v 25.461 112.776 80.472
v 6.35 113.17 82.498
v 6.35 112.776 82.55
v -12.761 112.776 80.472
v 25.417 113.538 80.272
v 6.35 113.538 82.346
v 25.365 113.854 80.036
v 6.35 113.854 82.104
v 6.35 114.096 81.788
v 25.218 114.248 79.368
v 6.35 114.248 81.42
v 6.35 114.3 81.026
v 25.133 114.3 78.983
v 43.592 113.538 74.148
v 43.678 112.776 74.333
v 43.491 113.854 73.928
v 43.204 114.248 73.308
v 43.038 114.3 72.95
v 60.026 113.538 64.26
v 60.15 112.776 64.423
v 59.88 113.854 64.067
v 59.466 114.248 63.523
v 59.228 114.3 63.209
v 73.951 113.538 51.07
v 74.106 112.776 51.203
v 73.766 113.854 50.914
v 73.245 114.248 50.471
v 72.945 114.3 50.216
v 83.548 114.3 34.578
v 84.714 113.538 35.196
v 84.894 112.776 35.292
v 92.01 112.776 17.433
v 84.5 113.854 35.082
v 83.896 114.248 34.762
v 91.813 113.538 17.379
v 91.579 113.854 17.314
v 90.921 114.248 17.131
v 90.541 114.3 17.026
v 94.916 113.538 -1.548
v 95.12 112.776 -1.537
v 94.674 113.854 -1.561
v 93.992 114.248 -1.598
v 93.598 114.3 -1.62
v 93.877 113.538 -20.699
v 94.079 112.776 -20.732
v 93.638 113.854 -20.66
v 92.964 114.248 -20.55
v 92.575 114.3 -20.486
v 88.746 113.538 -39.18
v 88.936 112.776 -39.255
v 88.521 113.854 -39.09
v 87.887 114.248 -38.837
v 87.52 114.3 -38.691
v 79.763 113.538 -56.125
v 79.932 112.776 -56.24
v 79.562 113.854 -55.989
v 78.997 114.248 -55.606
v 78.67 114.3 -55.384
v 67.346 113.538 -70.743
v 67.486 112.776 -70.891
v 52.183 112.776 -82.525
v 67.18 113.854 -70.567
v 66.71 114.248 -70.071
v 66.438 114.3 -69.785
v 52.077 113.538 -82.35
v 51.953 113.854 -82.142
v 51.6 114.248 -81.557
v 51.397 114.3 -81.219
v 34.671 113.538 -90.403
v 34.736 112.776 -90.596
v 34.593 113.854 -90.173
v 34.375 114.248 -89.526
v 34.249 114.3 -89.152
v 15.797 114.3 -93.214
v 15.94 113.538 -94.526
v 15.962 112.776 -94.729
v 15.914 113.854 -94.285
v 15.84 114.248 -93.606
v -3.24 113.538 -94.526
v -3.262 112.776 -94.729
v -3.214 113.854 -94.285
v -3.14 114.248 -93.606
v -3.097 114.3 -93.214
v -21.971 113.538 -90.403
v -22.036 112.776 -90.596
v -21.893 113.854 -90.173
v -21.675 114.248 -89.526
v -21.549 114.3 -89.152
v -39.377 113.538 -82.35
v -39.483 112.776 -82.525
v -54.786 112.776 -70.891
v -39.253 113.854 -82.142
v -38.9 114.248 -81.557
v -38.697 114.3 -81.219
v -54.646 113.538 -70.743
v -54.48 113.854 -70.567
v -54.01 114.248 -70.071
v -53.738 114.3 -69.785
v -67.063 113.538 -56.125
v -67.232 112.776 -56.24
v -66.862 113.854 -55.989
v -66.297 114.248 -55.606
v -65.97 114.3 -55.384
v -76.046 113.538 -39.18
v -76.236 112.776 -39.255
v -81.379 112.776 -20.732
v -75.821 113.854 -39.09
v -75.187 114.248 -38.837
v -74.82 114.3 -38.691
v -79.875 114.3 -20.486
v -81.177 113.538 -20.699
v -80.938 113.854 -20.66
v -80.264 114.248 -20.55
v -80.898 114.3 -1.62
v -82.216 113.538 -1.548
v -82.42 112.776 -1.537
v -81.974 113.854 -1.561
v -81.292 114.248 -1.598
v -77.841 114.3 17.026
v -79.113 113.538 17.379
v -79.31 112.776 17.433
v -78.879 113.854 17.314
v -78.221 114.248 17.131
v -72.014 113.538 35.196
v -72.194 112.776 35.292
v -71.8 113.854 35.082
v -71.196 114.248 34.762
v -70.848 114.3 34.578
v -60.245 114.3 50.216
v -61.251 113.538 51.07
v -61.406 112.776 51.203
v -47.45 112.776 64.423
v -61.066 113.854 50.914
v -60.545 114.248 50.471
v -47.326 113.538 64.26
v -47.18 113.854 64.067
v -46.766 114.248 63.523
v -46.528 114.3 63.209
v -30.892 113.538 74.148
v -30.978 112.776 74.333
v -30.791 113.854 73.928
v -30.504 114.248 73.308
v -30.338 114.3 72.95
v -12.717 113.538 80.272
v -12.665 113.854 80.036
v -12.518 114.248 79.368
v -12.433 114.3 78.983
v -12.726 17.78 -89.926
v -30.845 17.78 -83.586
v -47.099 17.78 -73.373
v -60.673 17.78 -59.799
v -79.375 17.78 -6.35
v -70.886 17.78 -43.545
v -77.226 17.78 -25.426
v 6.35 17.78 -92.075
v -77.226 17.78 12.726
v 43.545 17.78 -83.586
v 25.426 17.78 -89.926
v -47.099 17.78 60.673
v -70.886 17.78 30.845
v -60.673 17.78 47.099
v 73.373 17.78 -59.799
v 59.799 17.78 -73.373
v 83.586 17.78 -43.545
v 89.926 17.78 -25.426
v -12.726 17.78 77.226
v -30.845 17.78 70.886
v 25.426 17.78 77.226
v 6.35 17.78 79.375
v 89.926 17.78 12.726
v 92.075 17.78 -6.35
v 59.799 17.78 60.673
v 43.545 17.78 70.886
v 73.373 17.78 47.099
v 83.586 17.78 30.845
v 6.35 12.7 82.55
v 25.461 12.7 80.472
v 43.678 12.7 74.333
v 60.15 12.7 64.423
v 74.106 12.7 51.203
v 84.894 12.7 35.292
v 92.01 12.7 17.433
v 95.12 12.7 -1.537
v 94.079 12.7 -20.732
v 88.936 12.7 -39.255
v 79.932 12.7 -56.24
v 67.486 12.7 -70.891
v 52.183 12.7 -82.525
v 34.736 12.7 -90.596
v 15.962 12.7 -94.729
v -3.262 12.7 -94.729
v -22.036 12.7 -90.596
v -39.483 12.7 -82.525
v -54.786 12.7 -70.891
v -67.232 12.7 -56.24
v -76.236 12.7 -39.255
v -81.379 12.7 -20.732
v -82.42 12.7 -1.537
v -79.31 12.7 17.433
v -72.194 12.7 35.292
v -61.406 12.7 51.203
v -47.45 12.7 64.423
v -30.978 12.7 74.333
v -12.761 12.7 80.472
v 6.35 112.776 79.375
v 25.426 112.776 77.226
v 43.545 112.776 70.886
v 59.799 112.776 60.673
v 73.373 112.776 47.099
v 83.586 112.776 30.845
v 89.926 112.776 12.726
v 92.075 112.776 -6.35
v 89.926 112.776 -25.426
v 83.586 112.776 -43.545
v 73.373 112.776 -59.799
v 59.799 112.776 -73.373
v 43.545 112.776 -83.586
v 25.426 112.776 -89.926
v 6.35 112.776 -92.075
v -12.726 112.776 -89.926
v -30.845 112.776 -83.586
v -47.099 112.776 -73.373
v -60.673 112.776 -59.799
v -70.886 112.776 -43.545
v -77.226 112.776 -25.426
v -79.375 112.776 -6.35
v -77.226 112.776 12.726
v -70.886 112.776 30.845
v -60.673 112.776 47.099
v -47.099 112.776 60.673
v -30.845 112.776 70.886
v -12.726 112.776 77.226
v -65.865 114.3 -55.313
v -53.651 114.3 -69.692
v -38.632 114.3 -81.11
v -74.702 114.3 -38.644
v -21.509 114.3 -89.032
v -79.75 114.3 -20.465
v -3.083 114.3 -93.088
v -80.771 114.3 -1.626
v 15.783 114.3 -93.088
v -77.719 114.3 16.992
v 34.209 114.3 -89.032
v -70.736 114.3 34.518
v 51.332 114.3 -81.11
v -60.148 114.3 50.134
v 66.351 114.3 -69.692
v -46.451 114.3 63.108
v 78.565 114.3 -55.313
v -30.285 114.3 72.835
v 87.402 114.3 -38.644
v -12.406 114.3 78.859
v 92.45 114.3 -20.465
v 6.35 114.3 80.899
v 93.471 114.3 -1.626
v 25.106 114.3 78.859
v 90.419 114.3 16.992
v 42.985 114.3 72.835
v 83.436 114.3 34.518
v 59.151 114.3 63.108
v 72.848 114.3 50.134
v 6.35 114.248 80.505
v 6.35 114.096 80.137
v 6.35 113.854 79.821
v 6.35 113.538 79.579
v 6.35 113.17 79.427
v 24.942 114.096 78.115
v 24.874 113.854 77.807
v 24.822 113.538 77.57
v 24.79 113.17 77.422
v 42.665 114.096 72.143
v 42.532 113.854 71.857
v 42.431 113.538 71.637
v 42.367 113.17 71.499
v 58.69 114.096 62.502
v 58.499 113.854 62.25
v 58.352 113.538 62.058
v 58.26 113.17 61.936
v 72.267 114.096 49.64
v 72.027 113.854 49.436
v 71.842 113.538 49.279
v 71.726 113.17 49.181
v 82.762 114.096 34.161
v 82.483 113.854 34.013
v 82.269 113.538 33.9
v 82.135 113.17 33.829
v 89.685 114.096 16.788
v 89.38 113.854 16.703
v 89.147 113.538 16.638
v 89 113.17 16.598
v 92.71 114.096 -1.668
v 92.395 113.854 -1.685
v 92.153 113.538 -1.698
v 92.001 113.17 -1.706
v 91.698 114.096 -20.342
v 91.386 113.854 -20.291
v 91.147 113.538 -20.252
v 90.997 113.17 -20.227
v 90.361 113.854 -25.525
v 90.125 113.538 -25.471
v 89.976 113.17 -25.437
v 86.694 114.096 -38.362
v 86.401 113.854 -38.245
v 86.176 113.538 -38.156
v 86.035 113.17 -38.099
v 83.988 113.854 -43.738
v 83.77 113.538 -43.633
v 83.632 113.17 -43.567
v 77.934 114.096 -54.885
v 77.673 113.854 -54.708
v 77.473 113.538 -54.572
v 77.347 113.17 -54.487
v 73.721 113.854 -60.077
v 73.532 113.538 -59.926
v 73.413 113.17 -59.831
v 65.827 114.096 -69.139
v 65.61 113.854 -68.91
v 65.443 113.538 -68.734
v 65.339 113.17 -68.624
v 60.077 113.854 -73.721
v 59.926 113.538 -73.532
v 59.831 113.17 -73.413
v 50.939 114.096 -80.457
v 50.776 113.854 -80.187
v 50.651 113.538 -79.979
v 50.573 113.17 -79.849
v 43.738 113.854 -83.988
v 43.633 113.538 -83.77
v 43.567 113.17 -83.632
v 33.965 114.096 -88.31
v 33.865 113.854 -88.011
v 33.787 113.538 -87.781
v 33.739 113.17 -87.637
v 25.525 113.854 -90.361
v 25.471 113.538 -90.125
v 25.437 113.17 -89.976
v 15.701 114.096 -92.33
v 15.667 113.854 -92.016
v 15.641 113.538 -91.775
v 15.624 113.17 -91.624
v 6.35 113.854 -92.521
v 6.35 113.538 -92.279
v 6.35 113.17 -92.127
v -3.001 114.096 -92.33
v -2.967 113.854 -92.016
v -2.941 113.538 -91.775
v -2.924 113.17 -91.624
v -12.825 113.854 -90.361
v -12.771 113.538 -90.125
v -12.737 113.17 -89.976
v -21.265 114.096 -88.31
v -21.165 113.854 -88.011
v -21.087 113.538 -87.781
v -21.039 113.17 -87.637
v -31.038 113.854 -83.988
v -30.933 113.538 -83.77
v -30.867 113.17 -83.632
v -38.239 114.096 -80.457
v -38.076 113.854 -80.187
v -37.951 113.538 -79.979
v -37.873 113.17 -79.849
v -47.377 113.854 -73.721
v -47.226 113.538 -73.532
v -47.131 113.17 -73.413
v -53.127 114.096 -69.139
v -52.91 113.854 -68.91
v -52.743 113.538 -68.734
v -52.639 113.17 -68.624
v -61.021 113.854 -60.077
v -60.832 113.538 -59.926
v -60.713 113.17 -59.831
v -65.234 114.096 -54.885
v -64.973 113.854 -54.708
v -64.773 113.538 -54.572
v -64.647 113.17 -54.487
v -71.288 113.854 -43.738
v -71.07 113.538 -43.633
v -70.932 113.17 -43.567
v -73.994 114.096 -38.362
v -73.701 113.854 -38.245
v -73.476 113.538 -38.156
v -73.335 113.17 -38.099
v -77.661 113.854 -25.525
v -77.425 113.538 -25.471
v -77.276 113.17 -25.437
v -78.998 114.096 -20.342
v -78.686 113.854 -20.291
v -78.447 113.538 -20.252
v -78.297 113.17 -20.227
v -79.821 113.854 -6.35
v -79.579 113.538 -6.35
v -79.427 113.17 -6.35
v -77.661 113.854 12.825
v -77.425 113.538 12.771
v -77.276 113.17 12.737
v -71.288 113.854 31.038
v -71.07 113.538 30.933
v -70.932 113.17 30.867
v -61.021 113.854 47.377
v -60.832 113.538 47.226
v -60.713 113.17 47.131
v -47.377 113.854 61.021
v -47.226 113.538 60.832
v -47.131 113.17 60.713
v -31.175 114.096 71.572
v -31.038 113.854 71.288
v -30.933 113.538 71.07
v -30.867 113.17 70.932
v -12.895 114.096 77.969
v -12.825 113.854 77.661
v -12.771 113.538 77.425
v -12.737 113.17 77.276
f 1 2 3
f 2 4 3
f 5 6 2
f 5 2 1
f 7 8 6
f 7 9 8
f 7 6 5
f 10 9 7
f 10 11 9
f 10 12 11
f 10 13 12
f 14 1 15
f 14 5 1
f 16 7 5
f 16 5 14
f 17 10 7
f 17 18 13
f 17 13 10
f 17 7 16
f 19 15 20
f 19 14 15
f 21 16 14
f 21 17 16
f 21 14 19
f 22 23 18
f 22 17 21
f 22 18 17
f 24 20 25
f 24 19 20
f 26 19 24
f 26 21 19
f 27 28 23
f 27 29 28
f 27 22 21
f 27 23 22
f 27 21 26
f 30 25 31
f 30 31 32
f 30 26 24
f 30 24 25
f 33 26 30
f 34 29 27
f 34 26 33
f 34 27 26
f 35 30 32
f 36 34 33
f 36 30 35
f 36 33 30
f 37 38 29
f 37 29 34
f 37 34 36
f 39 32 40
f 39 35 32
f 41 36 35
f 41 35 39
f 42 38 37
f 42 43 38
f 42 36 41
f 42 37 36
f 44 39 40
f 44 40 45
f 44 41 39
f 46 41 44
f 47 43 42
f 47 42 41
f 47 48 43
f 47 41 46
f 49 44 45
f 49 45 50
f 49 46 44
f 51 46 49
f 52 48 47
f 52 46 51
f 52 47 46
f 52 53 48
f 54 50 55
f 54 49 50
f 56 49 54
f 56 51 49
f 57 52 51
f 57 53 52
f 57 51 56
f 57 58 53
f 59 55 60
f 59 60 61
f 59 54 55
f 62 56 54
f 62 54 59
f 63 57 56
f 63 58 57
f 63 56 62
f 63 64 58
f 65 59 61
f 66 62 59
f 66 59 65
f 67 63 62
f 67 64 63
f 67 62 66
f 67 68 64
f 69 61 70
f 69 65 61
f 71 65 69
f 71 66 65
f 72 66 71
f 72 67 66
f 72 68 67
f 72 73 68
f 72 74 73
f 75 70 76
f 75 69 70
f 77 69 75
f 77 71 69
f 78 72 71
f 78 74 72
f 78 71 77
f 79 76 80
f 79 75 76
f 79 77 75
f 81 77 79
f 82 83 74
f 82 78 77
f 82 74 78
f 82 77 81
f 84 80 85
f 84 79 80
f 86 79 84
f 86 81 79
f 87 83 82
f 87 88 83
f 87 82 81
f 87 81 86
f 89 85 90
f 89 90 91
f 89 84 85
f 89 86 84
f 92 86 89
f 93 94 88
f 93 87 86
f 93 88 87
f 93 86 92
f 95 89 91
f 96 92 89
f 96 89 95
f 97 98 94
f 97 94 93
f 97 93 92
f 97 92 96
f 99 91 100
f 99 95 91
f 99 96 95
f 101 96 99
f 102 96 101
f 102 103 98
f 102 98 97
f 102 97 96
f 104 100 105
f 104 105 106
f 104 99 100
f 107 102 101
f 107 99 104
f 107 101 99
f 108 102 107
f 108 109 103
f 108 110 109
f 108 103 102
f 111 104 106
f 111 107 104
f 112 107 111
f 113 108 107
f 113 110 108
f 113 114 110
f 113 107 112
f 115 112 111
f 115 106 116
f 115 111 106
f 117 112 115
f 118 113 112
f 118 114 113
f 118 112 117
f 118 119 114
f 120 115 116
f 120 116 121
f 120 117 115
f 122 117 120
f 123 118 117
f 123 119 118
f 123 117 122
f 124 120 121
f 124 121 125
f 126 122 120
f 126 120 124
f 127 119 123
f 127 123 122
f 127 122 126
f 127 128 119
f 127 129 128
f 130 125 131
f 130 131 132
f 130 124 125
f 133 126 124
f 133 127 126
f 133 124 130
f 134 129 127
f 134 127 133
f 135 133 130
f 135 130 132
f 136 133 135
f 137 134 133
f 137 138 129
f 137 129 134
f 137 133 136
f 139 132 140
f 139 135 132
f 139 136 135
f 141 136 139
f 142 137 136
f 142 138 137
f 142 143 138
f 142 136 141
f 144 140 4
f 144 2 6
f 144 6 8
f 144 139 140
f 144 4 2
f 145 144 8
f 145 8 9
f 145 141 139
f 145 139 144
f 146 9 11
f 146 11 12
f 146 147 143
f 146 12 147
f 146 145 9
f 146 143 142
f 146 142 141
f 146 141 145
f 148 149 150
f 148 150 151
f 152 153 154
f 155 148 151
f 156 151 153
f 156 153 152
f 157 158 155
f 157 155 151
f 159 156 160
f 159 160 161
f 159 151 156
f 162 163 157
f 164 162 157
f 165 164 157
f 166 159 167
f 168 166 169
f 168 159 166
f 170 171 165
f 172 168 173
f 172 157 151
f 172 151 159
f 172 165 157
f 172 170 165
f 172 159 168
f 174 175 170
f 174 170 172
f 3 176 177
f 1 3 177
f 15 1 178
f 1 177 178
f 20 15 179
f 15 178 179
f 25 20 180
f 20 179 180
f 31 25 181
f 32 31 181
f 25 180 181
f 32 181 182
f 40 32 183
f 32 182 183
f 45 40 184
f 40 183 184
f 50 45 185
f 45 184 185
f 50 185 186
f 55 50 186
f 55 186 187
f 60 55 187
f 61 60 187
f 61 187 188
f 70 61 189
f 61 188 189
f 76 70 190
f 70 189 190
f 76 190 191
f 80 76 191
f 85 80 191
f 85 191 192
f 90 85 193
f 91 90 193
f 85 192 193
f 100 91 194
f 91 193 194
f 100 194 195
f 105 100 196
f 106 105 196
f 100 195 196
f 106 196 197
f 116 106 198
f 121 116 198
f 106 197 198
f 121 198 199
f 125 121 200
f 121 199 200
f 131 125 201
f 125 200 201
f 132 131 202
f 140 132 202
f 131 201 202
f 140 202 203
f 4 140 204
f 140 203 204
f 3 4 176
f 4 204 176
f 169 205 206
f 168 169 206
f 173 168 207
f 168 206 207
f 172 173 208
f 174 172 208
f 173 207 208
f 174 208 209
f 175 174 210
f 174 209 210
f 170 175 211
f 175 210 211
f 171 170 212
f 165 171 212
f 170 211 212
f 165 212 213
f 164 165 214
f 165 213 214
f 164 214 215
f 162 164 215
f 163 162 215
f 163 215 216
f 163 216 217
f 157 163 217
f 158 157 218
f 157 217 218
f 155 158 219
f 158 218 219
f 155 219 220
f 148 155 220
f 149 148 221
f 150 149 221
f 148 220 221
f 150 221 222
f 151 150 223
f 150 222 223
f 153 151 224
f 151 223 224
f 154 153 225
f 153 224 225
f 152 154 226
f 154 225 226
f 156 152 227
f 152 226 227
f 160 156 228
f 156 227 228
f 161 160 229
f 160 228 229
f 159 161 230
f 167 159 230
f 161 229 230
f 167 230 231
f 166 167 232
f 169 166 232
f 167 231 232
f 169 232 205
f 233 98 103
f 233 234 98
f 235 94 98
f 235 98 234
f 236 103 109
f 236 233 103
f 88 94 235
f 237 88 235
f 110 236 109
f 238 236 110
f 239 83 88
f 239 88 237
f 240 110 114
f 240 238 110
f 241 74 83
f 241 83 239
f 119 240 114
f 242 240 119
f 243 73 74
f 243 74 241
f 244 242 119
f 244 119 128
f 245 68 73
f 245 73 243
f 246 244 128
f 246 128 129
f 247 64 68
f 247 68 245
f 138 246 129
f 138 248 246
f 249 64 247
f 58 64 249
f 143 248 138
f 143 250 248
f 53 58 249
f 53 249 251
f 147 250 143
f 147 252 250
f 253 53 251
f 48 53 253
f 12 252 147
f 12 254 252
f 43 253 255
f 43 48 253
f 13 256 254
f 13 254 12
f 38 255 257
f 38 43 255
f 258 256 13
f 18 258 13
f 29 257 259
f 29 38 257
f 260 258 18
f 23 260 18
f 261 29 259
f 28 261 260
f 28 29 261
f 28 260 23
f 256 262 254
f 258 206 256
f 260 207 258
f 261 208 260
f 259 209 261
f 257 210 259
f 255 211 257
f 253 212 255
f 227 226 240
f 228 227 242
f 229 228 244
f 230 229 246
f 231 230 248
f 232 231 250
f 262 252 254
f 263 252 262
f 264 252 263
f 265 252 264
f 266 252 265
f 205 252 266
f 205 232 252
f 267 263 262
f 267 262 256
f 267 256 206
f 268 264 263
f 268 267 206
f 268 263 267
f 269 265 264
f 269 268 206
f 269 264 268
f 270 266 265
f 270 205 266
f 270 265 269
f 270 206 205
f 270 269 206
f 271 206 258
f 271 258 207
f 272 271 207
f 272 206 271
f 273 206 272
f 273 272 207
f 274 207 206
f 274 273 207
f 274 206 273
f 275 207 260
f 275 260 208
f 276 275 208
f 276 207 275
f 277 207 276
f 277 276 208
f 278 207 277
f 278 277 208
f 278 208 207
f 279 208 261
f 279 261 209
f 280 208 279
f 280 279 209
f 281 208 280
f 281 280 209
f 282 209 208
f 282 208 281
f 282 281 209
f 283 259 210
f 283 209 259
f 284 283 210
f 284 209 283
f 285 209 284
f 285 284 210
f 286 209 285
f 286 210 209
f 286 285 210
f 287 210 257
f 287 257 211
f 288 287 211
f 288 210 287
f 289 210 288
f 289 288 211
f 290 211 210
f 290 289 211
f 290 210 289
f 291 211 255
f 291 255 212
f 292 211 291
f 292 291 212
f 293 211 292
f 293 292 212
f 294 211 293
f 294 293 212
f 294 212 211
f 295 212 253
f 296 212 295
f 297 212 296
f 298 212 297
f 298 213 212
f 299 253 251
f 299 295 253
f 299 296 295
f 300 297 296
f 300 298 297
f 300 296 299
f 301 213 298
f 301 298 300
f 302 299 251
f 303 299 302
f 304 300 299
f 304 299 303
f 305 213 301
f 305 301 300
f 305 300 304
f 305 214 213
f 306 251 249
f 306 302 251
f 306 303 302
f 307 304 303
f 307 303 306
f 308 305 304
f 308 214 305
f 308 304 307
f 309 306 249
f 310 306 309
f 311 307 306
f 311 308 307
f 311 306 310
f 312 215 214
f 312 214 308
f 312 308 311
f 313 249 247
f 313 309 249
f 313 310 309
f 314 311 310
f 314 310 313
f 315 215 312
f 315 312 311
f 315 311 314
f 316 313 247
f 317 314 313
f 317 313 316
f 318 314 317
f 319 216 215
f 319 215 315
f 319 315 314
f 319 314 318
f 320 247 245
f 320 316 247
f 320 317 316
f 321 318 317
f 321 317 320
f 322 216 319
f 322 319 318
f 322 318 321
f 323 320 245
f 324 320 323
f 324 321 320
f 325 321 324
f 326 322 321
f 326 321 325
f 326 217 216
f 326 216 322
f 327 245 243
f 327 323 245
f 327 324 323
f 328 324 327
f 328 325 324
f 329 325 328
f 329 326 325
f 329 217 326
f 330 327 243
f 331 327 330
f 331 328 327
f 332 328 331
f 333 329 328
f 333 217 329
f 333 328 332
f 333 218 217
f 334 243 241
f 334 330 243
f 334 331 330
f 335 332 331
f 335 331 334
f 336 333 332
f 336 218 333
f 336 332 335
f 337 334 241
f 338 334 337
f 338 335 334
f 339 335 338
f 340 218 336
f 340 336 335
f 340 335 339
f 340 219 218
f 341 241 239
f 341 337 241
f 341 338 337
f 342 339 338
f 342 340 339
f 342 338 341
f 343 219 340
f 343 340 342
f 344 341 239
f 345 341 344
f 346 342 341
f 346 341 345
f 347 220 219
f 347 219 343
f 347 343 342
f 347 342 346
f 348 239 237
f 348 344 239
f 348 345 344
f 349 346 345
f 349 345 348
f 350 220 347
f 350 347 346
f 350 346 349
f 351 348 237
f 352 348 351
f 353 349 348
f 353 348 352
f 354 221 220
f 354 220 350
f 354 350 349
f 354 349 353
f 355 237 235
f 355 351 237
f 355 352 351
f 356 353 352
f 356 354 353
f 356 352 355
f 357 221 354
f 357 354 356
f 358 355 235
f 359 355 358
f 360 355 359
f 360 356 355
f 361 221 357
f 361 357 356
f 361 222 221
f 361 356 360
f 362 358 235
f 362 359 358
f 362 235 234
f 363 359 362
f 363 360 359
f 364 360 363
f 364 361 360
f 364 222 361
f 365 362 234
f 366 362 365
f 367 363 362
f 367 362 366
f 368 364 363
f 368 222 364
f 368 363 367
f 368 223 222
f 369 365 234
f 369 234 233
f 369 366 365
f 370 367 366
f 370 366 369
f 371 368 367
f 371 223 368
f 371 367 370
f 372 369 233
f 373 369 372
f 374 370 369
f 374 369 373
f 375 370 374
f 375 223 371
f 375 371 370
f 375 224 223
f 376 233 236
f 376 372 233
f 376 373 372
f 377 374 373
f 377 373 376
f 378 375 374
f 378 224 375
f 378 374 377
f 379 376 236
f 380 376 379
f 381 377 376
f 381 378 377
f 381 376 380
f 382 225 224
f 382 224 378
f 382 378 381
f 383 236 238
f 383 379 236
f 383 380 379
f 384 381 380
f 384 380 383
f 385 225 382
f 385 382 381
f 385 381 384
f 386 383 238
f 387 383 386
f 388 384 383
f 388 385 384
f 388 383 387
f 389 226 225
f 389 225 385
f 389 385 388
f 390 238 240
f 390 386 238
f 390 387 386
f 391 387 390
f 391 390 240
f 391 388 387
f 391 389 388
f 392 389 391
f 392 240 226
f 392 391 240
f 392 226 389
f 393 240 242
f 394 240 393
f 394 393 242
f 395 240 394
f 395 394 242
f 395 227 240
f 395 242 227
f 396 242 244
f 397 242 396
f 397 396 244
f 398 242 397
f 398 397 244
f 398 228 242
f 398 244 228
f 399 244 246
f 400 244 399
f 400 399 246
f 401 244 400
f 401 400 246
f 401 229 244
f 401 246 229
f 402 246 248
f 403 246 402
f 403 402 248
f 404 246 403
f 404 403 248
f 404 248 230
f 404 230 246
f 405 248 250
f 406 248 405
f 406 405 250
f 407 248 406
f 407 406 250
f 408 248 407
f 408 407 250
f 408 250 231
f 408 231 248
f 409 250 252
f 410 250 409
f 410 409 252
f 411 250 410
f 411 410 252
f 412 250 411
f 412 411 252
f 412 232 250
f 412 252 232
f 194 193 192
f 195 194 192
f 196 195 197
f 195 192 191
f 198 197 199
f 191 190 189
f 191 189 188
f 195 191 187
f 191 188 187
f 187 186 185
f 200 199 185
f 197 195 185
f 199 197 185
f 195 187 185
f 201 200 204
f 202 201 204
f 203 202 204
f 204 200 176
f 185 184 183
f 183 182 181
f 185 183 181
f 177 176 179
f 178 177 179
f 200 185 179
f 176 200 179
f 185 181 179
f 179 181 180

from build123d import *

# Parameters (mm, degrees)
SKETCH1_W           = 12.7
SKETCH1_H           = 12.7
BOSS_EXTRUDE1_DEPTH = 12.7
SKETCH2_R           = 88.9
BOSS_EXTRUDE2_DEPTH = 101.6
SKETCH3_R           = 85.725
CUT_EXTRUDE1_DEPTH  = 96.52
SKETCH4_W           = 12.7
SKETCH4_H           = 12.7
CUT_EXTRUDE2_DEPTH  = 12.7
FILLET2_R           = 1.524


with BuildPart() as part:
    # Sketch1 → Boss-Extrude1 (new body)
    with BuildSketch(Plane(origin=(0, 0, 0), x_dir=(1, 0, 0), z_dir=(0, 1, 0))):
        with Locations((6.35, 6.35)):
            Rectangle(SKETCH1_W, SKETCH1_H)
    extrude(amount=BOSS_EXTRUDE1_DEPTH)

    # Sketch2 → Boss-Extrude2 (add)
    with BuildSketch(Plane(origin=(0, 12.7, 0), x_dir=(1, 0, 0), z_dir=(0, 1, 0))):
        with Locations(Location((6.35, 6.35, 0), (0, 0, 270))):
            Circle(SKETCH2_R)
    extrude(amount=BOSS_EXTRUDE2_DEPTH)

    # Sketch3 → Cut-Extrude1 (cut)
    with BuildSketch(Plane(origin=(0, 114.3, 0), x_dir=(1, 0, 0), z_dir=(0, 1, 0))):
        with Locations(Location((6.35, 6.35, 0), (0, 0, 270))):
            Circle(SKETCH3_R)
    extrude(amount=-CUT_EXTRUDE1_DEPTH, mode=Mode.SUBTRACT)

    # Sketch4 → Cut-Extrude2 (cut)
    with BuildSketch(Plane.XZ):
        with Locations((6.35, -6.35)):
            Rectangle(SKETCH4_W, SKETCH4_H)
    extrude(amount=-CUT_EXTRUDE2_DEPTH, mode=Mode.SUBTRACT)

    # Fillet2
    fillet2_edges = [part.edges().sort_by_distance(p)[0] for p in [
        (6.35, 114.3, -95.25),
        (6.35, 114.3, -92.075),
    ]]
    fillet(fillet2_edges, radius=FILLET2_R)


solid = part.part
